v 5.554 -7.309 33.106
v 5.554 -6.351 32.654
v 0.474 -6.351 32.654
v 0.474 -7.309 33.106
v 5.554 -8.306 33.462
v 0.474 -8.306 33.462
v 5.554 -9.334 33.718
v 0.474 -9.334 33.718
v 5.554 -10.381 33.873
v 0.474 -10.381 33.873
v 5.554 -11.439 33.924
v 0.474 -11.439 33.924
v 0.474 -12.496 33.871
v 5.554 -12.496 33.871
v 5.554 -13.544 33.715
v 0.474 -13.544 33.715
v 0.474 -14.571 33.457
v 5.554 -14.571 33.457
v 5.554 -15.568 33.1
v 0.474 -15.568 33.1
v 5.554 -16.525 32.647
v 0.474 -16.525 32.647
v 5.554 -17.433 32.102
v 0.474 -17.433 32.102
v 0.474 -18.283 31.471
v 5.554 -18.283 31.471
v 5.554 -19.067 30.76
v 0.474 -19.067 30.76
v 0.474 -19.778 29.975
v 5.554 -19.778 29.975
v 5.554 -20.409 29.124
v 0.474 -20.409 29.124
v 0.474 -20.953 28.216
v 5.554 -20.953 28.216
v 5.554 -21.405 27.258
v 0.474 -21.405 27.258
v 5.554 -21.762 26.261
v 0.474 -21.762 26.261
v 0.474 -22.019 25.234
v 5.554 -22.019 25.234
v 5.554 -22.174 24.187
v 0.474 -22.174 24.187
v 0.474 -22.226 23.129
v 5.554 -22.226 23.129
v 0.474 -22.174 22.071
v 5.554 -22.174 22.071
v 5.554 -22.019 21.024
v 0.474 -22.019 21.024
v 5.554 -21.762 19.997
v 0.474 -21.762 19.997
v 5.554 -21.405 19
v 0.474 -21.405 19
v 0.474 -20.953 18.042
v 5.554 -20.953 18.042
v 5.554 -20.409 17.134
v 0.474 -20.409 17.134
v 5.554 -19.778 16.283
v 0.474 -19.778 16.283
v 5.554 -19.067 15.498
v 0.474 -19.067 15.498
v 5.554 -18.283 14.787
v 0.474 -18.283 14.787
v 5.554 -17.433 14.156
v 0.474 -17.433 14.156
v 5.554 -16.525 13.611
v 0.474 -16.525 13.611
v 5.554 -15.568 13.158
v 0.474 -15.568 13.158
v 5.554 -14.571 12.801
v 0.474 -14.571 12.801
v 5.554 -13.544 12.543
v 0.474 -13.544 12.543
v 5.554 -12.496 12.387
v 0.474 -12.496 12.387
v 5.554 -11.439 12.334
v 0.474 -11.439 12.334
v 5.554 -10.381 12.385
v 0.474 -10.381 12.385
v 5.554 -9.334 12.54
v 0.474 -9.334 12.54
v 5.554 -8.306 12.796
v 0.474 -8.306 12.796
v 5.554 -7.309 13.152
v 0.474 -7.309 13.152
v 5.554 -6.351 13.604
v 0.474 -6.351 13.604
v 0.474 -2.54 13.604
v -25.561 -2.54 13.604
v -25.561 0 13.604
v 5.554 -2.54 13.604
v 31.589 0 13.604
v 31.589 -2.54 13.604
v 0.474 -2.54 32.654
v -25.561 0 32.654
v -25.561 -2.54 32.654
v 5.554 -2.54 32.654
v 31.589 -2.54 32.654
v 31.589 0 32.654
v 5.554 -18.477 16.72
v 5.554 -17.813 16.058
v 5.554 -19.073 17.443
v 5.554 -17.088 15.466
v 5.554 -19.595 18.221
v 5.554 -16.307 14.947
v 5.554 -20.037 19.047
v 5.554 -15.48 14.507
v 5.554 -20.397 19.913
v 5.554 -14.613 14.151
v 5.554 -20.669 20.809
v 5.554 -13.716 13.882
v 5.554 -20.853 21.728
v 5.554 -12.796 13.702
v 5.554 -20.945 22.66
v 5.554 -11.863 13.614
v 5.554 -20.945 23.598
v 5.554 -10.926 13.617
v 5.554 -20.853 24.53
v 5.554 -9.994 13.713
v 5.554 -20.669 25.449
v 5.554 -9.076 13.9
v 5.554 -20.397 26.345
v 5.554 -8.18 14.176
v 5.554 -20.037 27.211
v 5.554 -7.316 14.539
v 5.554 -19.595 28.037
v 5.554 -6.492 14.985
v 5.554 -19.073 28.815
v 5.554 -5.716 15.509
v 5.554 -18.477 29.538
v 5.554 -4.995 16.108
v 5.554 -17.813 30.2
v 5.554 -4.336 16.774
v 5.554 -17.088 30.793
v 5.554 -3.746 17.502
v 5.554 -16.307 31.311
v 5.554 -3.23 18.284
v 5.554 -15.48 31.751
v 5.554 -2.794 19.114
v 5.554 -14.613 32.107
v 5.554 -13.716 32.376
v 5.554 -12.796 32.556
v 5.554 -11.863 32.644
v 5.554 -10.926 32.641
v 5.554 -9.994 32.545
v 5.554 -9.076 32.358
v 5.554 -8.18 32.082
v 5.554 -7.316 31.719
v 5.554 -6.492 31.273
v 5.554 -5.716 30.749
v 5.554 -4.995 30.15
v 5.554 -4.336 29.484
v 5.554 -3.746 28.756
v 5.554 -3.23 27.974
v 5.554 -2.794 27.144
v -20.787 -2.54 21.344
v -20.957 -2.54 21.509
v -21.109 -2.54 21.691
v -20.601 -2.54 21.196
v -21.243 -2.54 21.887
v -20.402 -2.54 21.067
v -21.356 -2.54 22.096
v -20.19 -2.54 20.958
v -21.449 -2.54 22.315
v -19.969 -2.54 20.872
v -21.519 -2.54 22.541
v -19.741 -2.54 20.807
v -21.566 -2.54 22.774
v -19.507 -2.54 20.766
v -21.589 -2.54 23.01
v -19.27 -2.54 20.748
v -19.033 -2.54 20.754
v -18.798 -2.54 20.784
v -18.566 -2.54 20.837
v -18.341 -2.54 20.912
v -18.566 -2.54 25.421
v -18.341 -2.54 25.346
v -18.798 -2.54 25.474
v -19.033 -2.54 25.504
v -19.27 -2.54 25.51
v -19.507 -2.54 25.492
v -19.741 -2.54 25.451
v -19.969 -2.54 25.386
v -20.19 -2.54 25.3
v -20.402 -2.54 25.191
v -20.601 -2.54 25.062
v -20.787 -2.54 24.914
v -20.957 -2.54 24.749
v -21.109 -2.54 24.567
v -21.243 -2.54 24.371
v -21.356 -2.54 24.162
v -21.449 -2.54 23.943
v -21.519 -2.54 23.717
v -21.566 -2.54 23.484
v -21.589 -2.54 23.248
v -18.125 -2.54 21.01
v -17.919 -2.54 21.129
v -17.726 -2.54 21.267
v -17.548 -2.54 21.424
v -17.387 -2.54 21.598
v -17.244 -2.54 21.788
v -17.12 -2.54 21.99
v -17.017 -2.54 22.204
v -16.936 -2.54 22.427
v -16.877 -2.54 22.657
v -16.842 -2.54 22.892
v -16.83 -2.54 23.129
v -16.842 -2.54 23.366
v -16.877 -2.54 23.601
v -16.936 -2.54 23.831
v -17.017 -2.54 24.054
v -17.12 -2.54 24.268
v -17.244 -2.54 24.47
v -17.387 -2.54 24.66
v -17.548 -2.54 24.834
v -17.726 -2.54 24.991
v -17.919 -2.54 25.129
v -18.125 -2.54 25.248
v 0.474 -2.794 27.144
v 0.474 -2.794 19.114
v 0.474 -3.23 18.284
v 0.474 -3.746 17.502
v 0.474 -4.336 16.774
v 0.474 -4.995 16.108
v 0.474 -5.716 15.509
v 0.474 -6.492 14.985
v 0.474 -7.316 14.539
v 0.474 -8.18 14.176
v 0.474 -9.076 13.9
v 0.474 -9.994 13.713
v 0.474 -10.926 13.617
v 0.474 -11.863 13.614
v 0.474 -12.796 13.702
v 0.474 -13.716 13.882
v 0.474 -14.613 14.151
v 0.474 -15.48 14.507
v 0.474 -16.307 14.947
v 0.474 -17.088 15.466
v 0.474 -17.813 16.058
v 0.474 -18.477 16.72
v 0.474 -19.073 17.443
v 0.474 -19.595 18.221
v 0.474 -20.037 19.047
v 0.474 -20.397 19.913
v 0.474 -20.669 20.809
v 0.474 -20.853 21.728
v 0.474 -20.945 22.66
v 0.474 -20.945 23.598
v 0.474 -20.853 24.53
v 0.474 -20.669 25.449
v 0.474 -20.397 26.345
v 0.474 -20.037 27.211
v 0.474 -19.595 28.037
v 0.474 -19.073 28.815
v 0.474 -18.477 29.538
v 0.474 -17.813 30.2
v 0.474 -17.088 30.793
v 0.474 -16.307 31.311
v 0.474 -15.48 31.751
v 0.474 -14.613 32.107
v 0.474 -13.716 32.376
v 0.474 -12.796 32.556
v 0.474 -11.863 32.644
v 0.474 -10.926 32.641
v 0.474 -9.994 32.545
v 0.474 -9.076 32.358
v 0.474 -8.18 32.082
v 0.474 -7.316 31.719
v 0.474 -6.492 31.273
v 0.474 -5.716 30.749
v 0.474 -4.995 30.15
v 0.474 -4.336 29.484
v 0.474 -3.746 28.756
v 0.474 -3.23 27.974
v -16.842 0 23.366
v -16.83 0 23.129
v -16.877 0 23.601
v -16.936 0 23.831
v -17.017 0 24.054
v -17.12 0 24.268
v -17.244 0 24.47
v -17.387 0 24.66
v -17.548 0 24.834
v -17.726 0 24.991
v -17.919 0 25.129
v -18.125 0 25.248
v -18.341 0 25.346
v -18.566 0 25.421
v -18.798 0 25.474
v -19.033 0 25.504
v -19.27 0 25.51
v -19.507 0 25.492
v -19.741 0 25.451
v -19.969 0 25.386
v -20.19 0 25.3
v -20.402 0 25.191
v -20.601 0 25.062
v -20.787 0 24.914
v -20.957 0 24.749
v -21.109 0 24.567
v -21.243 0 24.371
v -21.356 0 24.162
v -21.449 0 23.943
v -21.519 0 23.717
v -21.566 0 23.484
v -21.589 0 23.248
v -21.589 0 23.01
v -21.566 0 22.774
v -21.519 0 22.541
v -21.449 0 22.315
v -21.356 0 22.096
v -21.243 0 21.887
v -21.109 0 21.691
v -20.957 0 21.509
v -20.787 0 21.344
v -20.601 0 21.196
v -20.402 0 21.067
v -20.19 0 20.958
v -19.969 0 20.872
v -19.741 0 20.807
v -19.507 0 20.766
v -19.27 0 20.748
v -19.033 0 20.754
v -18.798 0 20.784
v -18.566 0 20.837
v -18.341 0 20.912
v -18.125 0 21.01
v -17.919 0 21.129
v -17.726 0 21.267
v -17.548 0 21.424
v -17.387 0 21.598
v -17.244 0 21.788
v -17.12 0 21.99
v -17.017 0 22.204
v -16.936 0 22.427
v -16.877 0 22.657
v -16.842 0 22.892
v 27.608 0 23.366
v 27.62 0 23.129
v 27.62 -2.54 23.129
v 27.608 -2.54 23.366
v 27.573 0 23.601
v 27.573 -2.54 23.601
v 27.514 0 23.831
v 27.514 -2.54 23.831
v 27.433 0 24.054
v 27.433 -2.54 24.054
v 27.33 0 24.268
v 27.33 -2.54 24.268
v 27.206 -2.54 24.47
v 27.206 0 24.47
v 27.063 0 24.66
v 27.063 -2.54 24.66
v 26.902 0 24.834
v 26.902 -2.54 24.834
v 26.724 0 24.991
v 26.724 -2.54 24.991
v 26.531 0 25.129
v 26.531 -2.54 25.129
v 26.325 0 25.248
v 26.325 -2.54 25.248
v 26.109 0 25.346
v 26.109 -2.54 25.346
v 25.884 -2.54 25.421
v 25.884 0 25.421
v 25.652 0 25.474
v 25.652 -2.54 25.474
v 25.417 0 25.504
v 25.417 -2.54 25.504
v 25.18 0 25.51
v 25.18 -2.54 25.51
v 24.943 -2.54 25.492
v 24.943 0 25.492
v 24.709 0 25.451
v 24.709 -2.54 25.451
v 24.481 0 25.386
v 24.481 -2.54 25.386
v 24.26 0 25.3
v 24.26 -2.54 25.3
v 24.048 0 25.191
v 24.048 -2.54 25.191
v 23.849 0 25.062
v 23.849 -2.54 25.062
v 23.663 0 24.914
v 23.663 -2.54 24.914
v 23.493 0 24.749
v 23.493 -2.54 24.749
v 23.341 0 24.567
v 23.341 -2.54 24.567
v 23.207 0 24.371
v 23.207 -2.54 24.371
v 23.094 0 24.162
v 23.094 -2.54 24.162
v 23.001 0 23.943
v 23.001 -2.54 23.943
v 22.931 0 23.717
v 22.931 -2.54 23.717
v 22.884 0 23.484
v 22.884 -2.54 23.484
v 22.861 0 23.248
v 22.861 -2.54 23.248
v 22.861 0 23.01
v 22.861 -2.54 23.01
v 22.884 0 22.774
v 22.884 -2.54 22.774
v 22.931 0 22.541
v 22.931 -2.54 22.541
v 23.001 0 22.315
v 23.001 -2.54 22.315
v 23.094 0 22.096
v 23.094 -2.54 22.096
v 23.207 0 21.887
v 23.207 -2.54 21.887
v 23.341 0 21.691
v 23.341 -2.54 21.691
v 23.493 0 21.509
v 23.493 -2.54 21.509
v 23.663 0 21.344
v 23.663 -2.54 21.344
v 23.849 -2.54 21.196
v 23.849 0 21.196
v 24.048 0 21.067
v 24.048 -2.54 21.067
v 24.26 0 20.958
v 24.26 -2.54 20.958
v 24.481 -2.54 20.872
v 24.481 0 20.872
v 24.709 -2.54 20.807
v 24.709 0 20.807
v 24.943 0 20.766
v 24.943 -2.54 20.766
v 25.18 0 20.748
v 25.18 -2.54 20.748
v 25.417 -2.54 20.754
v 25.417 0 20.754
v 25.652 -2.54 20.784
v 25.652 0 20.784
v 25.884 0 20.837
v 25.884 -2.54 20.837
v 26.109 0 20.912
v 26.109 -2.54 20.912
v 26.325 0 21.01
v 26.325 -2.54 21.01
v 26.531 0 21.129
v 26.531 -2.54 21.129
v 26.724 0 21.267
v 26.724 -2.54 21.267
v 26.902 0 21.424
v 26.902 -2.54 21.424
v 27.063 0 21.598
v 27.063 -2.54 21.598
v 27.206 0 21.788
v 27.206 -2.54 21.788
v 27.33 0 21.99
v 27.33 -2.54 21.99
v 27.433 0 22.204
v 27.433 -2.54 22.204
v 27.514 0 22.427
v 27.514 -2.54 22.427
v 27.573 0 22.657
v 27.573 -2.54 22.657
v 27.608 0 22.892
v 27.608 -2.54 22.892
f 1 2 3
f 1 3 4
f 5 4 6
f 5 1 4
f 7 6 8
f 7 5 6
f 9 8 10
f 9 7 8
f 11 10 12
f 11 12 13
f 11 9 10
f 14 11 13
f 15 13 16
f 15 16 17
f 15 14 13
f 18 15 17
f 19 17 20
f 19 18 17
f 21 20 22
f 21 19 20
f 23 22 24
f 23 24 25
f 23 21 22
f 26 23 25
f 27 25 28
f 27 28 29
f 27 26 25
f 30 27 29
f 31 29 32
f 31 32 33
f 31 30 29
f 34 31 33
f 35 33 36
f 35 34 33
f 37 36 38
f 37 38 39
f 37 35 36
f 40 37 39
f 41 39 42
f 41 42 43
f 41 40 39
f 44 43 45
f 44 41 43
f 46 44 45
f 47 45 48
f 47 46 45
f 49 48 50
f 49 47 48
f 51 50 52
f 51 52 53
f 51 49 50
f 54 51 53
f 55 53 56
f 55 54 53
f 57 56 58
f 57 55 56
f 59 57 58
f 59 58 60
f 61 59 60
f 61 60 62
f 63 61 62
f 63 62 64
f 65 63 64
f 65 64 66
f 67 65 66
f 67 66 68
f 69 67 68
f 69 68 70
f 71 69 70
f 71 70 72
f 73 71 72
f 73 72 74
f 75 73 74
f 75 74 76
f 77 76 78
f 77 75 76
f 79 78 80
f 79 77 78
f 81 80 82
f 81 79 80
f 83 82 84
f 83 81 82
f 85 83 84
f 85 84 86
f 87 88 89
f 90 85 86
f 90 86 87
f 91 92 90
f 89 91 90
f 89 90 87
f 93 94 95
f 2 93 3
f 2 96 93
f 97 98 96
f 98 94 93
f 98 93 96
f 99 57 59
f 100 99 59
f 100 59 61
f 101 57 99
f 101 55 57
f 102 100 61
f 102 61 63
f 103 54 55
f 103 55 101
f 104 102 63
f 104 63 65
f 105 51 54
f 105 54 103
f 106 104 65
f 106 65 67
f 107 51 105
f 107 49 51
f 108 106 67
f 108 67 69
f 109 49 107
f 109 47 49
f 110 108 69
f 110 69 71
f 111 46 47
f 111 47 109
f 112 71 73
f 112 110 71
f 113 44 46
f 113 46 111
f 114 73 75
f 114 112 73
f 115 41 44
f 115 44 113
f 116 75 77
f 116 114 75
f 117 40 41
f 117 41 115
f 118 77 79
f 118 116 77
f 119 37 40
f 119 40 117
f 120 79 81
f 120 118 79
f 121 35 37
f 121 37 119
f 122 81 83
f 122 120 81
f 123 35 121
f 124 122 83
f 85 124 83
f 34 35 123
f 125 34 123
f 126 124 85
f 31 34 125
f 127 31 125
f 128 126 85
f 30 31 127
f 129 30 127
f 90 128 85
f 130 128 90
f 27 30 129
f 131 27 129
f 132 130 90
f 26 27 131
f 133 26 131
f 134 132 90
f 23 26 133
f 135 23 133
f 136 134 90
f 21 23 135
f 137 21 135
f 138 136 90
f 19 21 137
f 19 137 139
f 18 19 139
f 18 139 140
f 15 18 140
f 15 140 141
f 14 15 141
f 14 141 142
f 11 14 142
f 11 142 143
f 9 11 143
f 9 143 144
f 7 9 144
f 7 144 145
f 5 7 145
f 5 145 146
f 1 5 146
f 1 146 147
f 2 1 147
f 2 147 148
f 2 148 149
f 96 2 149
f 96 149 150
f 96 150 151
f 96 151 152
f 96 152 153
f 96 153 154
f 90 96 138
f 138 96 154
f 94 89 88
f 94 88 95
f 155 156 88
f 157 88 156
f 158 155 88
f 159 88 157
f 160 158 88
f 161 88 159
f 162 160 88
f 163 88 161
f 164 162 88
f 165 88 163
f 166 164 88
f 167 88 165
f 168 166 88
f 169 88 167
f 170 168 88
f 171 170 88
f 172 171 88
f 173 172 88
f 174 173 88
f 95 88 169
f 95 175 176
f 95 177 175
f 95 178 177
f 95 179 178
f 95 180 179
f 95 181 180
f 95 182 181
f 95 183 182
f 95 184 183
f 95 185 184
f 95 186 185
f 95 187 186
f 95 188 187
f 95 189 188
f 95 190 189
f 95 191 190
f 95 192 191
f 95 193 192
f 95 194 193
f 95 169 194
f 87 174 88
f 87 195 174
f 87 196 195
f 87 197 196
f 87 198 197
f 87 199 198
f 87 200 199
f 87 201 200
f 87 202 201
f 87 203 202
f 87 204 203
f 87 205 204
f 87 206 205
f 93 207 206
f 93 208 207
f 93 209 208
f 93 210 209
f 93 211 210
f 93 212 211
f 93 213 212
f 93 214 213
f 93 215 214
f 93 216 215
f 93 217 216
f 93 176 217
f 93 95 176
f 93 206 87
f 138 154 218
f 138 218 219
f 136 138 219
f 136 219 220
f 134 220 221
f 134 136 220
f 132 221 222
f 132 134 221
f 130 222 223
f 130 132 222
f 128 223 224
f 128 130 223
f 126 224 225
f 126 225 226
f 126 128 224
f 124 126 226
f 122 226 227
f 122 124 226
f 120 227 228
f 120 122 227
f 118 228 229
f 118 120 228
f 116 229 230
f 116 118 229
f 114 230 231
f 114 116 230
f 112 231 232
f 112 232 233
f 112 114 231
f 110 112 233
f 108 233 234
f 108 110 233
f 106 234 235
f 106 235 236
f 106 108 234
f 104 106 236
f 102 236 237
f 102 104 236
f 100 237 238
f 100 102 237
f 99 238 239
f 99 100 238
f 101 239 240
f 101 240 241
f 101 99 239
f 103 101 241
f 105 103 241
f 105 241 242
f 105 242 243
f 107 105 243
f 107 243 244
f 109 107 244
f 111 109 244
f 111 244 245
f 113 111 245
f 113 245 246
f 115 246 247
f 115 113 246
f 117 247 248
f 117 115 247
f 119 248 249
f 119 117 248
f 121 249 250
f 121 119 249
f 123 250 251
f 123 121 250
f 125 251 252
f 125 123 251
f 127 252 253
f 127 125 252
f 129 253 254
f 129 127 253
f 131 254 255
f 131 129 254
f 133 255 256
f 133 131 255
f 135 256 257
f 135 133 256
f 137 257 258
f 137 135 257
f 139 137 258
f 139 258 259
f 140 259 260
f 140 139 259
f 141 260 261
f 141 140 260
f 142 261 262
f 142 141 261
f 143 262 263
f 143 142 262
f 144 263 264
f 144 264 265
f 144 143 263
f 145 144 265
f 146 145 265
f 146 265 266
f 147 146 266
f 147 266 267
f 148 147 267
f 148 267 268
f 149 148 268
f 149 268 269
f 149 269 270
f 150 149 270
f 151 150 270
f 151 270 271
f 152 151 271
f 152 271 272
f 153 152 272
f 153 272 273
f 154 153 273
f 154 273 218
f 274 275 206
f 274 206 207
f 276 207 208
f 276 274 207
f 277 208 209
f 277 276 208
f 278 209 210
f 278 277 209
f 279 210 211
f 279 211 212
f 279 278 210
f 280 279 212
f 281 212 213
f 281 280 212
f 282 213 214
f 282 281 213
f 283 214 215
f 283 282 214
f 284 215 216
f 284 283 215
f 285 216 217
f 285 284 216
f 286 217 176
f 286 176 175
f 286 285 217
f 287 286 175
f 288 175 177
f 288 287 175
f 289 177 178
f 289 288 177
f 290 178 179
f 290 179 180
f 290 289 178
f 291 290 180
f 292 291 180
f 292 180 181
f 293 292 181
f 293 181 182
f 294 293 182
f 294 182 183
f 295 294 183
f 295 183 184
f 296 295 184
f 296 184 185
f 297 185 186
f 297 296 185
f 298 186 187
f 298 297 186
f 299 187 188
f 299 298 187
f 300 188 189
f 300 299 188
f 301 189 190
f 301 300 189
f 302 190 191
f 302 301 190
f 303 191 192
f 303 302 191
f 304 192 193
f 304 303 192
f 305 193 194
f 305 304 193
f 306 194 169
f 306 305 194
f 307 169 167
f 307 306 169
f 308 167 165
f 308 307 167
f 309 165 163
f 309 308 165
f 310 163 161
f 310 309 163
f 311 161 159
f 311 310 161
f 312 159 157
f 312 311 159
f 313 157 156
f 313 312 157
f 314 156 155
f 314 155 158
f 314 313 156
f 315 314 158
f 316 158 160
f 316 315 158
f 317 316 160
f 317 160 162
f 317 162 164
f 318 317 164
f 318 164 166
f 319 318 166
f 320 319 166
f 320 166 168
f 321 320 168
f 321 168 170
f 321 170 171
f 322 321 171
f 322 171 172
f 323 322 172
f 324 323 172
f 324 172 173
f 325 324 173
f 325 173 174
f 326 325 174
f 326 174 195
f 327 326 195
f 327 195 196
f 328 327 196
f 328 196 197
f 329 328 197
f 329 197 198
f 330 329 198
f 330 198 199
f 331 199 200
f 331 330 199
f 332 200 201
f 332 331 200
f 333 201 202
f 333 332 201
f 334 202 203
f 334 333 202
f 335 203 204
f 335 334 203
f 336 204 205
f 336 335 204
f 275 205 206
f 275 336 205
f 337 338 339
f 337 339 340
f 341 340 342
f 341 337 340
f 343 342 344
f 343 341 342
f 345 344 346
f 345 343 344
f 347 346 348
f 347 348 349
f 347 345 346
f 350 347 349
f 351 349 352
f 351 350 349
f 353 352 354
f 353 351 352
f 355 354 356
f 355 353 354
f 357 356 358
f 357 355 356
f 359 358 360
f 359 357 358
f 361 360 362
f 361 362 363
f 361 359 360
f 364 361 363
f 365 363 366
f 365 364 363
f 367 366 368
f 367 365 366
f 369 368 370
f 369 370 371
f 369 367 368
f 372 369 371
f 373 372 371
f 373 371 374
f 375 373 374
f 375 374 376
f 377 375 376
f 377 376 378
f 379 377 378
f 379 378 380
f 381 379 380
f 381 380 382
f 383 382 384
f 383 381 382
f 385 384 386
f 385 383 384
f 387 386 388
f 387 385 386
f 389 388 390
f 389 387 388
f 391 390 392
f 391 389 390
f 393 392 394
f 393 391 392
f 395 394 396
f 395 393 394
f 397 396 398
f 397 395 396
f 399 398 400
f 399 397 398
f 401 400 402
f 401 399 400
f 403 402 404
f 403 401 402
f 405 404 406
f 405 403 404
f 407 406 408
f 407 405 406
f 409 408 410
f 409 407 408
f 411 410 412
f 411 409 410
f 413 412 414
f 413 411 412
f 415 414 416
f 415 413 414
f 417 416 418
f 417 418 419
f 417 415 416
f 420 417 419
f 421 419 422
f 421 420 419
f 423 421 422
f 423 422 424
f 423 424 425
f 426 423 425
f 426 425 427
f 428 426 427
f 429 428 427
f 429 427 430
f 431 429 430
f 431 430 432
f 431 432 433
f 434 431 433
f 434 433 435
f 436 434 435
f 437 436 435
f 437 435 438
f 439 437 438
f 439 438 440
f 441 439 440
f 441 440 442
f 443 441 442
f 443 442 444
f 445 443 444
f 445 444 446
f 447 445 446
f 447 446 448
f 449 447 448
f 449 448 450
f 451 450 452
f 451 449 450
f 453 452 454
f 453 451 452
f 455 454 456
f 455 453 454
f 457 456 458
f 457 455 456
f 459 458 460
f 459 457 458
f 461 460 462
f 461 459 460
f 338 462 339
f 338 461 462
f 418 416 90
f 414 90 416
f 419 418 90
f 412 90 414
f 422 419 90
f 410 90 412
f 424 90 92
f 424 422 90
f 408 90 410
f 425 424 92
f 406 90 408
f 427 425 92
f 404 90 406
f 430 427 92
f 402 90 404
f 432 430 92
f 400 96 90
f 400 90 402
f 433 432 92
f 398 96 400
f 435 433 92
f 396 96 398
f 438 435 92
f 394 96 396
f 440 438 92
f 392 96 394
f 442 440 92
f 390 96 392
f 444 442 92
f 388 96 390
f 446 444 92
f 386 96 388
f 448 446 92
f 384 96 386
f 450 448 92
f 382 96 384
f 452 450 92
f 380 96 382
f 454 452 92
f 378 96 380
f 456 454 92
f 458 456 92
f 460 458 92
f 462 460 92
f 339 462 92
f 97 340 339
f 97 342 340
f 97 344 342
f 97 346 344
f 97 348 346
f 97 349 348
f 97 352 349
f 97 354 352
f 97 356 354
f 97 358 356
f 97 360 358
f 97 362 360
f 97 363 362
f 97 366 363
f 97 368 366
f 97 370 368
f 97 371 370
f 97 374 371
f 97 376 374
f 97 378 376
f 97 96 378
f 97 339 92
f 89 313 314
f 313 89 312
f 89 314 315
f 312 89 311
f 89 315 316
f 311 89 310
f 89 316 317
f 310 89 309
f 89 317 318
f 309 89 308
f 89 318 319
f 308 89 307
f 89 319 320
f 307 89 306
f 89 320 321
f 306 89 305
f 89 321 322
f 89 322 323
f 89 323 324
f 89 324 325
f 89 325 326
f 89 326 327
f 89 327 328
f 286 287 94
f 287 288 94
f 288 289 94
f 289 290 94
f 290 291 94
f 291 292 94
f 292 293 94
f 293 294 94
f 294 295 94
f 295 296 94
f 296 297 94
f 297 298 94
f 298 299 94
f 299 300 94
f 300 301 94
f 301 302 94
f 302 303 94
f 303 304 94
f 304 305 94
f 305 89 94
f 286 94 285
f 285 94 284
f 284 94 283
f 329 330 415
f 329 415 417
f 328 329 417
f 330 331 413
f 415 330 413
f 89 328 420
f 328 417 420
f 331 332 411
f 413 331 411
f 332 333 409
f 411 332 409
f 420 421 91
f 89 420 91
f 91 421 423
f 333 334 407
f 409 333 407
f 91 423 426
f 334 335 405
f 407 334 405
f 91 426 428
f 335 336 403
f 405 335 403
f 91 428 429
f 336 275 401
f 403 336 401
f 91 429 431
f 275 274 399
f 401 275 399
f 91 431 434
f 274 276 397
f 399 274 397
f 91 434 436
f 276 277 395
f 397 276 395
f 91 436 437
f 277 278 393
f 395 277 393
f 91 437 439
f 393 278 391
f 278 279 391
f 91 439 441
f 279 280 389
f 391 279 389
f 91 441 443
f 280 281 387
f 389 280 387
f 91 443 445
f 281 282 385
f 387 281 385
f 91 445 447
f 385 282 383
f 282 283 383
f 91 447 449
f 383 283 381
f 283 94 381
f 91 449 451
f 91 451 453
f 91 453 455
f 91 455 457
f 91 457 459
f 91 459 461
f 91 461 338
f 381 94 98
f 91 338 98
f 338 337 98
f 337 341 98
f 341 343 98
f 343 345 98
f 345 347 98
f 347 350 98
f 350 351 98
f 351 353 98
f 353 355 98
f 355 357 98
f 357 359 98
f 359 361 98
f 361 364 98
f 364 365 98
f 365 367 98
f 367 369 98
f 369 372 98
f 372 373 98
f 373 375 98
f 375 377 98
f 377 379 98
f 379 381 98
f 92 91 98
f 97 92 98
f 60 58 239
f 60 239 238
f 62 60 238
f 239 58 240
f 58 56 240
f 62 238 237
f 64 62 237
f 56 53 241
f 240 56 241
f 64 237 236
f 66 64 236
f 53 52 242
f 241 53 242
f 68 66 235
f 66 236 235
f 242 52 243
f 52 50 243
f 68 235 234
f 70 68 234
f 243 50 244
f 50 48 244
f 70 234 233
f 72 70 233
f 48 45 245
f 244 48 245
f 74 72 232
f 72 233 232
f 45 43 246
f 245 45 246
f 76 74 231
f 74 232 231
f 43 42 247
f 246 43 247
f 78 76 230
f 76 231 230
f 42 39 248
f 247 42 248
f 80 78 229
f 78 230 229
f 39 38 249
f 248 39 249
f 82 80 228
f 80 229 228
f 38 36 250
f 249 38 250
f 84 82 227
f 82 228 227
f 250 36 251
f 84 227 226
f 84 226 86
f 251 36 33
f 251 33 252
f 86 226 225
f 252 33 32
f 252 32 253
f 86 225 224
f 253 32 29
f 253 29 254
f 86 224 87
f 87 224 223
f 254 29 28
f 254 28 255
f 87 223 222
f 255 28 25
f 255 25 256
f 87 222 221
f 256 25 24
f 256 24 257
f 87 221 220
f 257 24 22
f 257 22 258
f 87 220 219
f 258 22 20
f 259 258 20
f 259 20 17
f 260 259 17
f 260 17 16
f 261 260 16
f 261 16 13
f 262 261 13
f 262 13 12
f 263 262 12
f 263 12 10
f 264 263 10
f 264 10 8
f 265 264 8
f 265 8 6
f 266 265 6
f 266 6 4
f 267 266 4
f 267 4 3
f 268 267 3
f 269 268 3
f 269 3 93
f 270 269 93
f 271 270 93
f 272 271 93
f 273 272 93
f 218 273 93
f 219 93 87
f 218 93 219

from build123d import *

# Parameters (mm, degrees)
F0_W     = 57.15
F0_H     = 19.05
F0_R     = 2.38125
F1_DEPTH = 2.54
F2_W     = 5.08
F2_H     = 13.97
F3_DEPTH = 0.254
F5_DEPTH = 5.08


with BuildPart() as f1:
    # F0 (on Front) → F1 (new body)
    with BuildSketch(Plane.XZ):
        with Locations((3.013964, 23.129006)):
            Rectangle(F0_W, F0_H)
        with Locations((-19.211036, 23.129006)):
            Circle(F0_R, mode=Mode.SUBTRACT)
        with Locations((25.238964, 23.129006)):
            Circle(F0_R, mode=Mode.SUBTRACT)
    extrude(amount=F1_DEPTH)

    # F2 (on face) → F3 (join)
    with BuildSketch(Plane.XZ.offset(2.54)):
        with Locations((3.013964, 23.129006)):
            Rectangle(F2_W, F2_H)
    extrude(amount=F3_DEPTH)

    # F4 (on face) → F5 (join)
    with BuildSketch(Plane.YZ.offset(5.553964)):
        with BuildLine():
            Line((-2.54, 19.71271), (-2.54, 26.545301))
            ThreePointArc((-2.54, 26.545301), (-2.661883, 26.847016), (-2.794, 27.144391))
            Line((-2.794, 27.144391), (-2.794, 19.11362))
            ThreePointArc((-2.794, 19.11362), (-2.661883, 19.410996), (-2.54, 19.71271))
        make_face()
        with BuildLine():
            ThreePointArc((-2.794, 27.144391), (-2.661883, 26.847016), (-2.54, 26.545301))
            Line((-2.54, 26.545301), (-2.54, 32.654006))
            Line((-2.54, 32.654006), (-6.351263, 32.654006))
            ThreePointArc((-6.351263, 32.654006), (-22.226263, 23.129006), (-6.351263, 13.604006))
            Line((-6.351263, 13.604006), (-2.54, 13.604006))
            Line((-2.54, 13.604006), (-2.54, 19.71271))
            ThreePointArc((-2.54, 19.71271), (-2.661883, 19.410996), (-2.794, 19.11362))
            ThreePointArc((-2.794, 19.11362), (-20.956263, 23.129006), (-2.794, 27.144391))
        make_face()
    extrude(amount=-F5_DEPTH)


solid = f1.part
